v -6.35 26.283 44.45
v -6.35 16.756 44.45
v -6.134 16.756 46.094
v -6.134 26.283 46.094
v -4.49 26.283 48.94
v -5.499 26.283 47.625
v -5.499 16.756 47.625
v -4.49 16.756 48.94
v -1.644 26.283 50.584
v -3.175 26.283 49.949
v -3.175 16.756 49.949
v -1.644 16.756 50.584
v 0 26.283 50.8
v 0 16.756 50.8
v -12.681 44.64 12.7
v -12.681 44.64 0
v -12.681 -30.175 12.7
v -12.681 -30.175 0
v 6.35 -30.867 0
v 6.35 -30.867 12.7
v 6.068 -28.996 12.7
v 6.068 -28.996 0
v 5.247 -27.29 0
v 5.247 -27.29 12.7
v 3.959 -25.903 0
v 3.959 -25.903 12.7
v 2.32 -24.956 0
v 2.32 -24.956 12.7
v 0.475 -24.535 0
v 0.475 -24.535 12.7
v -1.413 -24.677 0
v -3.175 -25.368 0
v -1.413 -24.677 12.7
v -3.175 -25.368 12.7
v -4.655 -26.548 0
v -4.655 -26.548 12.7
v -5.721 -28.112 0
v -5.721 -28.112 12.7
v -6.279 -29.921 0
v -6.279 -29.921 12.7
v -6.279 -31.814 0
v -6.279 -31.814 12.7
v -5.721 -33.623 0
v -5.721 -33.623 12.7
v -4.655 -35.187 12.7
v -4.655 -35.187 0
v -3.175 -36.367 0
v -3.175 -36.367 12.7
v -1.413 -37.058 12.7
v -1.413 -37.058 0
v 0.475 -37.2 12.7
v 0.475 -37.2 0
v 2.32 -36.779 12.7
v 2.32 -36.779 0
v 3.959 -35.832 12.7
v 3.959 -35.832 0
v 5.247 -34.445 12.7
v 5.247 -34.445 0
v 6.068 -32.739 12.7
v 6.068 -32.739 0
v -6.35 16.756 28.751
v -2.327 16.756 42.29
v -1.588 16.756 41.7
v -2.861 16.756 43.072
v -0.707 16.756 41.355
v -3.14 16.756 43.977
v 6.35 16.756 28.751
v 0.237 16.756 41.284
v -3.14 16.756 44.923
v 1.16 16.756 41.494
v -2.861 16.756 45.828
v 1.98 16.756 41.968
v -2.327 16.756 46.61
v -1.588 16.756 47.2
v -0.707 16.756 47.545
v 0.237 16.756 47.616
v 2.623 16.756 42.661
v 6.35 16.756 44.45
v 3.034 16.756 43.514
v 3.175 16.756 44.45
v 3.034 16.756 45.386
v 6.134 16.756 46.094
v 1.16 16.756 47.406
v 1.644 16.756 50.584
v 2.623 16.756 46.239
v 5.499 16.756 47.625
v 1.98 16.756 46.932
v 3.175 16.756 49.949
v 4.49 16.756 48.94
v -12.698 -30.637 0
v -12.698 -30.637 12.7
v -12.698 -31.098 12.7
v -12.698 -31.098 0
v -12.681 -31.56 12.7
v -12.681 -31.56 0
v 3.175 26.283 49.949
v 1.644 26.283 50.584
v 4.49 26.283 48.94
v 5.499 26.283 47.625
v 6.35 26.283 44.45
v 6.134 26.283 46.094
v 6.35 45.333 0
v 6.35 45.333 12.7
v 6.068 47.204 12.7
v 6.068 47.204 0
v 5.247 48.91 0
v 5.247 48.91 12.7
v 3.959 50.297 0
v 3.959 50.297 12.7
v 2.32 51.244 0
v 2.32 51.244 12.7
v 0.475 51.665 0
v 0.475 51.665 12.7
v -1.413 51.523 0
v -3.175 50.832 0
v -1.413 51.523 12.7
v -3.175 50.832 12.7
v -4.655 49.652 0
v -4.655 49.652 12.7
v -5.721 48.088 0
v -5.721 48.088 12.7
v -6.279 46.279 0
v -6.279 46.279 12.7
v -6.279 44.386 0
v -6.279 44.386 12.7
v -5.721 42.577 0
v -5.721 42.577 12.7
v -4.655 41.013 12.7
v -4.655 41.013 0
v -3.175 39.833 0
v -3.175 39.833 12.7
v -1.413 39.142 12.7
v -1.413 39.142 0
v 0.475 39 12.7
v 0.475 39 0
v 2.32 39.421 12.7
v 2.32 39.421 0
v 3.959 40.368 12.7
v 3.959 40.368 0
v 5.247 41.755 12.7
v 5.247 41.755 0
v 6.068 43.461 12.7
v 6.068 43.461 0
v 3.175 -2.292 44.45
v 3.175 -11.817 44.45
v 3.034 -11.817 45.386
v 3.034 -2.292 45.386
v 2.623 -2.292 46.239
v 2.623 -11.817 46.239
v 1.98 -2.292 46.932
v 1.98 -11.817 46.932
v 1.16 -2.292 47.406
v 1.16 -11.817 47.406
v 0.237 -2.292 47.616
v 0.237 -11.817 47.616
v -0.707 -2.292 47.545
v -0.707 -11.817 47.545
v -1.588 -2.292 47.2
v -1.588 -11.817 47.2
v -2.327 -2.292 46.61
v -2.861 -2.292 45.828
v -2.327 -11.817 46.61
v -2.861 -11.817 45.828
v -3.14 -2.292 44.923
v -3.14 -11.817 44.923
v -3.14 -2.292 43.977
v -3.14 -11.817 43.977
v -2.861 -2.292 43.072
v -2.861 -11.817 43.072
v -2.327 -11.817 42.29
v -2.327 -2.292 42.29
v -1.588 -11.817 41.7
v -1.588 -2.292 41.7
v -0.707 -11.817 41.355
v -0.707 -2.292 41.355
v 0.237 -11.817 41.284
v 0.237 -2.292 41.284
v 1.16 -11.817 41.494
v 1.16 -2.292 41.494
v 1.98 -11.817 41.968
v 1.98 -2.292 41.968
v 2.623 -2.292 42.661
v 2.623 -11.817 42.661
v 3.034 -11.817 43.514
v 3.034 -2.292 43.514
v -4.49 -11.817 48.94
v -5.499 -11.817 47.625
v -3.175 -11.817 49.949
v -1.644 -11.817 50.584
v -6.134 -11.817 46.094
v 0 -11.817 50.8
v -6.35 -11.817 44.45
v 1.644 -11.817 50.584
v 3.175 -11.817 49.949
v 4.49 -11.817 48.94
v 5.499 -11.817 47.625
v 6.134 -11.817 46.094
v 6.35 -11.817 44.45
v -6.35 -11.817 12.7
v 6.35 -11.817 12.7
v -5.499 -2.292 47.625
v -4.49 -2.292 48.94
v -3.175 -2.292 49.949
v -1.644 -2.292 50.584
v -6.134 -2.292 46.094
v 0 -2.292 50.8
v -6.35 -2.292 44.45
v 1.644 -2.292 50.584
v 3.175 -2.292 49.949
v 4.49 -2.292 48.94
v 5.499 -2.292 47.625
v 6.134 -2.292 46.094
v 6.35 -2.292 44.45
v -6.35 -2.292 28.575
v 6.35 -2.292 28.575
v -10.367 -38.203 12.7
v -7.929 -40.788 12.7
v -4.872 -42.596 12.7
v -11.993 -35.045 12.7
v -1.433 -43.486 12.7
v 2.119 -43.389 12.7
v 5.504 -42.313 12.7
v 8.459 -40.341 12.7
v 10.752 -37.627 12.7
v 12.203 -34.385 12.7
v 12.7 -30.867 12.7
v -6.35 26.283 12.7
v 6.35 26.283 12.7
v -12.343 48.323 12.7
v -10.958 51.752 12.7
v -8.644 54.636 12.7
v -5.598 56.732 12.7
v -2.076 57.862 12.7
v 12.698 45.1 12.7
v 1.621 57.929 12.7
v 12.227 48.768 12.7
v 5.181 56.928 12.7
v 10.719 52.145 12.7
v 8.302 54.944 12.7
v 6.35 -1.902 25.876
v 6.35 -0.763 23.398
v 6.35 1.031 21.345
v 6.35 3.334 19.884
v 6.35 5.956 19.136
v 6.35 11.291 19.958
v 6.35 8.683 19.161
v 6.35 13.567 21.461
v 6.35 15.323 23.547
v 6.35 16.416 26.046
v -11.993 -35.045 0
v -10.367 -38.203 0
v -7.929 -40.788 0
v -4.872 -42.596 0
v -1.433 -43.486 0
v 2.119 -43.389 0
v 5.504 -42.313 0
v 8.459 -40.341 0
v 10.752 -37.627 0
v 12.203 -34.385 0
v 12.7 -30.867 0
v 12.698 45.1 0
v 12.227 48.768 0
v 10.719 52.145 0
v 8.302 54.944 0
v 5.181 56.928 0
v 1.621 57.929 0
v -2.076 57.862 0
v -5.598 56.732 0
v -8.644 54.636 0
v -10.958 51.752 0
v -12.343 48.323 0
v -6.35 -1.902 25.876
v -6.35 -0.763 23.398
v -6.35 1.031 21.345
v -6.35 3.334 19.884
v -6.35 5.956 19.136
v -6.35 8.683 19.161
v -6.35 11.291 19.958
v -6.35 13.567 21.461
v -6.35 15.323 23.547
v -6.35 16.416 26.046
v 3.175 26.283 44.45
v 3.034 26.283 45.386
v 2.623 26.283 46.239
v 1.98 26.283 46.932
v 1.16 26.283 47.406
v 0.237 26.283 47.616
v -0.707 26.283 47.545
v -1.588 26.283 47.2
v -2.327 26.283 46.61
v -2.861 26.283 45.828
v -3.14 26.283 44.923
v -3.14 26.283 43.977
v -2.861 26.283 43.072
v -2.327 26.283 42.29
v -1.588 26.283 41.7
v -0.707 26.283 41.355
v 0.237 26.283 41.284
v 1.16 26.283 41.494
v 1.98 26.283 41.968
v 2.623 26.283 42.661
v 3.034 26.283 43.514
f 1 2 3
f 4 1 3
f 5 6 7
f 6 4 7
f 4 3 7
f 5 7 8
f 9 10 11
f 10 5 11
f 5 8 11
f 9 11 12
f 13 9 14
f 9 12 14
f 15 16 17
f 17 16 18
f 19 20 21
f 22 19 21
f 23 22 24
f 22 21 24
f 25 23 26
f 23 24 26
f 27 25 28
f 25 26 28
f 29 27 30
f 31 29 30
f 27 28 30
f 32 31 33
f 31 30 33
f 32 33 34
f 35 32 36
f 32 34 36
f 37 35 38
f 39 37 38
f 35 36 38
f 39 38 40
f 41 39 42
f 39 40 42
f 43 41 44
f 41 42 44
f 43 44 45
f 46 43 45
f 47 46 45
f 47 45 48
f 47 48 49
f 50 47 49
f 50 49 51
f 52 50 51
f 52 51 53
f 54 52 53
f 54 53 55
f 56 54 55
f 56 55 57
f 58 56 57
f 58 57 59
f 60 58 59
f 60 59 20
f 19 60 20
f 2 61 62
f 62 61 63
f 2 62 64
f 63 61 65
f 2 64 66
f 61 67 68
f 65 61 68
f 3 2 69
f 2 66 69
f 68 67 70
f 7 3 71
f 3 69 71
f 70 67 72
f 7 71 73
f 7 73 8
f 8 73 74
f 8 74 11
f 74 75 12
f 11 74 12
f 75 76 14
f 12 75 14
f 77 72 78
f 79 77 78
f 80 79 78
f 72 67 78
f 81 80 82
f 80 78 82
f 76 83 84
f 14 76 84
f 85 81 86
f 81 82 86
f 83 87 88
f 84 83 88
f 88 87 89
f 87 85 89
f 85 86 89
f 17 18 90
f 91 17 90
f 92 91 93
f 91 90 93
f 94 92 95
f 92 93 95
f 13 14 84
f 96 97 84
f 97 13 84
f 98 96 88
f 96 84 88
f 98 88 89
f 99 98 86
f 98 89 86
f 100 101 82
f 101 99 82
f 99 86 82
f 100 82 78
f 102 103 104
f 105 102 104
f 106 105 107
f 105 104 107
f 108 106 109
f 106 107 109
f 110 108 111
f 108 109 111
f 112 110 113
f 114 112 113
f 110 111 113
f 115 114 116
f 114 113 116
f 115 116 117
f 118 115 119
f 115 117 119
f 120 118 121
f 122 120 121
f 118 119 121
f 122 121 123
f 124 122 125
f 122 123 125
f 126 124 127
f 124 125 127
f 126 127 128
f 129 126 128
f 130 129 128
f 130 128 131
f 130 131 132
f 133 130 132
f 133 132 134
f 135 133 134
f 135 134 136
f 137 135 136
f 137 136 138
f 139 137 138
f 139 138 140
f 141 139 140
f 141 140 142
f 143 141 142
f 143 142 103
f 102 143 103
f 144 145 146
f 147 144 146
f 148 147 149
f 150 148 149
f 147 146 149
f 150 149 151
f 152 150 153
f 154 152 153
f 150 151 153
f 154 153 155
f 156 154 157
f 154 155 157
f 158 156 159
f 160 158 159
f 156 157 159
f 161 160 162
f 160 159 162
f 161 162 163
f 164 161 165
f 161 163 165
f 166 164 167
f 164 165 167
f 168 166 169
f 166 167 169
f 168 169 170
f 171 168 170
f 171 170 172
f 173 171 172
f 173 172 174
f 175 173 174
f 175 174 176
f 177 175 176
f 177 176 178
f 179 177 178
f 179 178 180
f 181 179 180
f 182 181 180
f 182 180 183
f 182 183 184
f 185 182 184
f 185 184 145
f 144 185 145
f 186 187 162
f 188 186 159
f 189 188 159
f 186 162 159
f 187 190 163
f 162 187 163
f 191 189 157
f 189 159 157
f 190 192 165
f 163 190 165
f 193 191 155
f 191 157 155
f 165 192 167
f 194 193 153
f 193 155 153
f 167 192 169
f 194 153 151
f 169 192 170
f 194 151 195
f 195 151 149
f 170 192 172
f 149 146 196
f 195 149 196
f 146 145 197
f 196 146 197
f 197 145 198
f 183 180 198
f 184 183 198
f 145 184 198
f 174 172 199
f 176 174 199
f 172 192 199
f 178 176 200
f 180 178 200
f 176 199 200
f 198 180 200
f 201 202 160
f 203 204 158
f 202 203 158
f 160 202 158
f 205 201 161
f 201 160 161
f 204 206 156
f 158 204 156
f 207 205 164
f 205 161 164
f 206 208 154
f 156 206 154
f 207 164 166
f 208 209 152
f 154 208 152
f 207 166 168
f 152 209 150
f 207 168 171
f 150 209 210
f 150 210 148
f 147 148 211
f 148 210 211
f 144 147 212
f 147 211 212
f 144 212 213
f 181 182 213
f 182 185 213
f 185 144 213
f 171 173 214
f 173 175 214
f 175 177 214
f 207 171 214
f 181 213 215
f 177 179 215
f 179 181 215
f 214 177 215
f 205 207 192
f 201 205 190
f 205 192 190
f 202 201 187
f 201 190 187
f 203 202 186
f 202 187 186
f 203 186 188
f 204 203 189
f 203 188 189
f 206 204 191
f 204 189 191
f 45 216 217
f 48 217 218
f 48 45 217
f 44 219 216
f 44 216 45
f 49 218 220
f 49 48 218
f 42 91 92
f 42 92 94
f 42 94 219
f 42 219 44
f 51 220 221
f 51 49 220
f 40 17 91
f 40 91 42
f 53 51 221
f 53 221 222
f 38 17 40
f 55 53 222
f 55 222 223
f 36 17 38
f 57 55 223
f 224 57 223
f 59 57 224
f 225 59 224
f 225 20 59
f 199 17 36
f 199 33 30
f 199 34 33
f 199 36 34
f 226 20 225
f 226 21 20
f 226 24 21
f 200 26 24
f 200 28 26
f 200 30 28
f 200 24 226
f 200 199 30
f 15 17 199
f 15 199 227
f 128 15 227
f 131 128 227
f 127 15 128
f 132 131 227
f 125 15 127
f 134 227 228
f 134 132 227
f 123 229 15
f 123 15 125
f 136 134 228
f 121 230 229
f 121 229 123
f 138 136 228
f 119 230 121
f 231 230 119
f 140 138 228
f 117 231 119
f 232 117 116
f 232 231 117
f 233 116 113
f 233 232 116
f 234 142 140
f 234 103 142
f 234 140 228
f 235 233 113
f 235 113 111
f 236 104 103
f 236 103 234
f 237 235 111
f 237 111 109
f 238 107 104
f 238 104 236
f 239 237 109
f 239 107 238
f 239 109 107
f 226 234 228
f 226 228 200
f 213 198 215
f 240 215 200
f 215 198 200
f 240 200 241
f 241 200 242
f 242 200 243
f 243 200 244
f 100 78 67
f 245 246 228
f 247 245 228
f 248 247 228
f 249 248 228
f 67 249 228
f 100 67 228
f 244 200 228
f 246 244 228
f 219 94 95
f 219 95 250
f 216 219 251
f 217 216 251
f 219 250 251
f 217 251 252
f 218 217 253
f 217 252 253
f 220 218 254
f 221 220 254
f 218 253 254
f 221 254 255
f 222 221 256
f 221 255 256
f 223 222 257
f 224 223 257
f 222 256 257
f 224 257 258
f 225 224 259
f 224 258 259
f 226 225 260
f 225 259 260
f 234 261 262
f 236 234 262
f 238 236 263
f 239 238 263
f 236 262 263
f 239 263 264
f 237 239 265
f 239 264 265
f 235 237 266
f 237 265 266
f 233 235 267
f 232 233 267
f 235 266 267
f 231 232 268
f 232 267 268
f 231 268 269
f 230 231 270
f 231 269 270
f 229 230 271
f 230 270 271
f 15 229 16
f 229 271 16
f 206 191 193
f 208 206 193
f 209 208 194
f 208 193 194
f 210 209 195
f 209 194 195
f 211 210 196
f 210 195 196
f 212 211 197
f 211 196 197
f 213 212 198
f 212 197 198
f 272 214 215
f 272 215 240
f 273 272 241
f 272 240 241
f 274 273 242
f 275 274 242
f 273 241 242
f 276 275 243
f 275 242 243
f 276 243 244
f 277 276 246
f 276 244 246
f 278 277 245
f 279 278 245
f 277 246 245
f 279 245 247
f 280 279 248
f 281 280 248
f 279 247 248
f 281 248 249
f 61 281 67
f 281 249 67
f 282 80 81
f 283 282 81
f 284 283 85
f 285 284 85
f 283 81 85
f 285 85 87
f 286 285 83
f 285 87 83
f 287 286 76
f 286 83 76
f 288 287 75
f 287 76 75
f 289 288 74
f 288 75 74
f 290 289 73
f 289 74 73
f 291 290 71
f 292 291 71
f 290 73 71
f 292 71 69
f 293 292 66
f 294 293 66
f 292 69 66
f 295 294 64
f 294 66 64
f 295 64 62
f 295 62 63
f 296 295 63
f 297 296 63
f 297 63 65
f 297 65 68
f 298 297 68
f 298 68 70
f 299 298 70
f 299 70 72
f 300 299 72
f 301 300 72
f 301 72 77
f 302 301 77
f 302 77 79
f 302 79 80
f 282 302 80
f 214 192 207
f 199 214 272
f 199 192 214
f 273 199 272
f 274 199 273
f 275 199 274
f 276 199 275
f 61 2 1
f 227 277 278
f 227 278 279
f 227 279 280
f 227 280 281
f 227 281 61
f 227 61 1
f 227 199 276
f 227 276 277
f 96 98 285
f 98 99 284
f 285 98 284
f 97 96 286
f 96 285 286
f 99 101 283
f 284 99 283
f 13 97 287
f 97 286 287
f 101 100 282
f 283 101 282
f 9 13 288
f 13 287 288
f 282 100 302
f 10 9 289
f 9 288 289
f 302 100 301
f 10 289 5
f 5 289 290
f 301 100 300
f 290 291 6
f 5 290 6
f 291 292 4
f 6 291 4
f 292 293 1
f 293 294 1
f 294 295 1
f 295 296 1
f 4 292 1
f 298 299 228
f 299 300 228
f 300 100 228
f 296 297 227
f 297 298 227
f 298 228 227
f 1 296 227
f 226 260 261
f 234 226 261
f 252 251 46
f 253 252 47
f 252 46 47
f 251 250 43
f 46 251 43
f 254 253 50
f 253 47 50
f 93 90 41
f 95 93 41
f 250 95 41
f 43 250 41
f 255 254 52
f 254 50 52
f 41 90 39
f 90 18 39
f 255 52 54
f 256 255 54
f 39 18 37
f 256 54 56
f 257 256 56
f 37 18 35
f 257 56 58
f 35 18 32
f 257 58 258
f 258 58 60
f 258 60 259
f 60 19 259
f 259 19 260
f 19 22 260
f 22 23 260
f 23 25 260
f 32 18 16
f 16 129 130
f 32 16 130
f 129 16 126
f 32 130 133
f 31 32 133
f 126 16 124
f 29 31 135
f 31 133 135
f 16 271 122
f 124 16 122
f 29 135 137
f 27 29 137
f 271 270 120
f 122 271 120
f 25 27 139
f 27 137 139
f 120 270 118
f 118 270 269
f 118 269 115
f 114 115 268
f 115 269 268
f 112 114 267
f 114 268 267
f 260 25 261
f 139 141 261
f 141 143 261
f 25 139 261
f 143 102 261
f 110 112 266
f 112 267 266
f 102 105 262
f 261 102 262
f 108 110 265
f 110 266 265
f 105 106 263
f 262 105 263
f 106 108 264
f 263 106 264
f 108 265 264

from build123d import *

# Parameters (mm, degrees)
F1_DEPTH  = 12.7
F2_R      = 6.35
F3_DEPTH  = 31.242
F4_W      = 6.35
F4_H      = 38.1
F5_DEPTH  = 38.1
F7_DEPTH  = 61.468
F9_DEPTH  = 25.4
F10_R     = 3.175
F11_DEPTH = 50.8


with BuildPart() as f1:
    # F0 (on Top) → F1 (new body)
    with BuildSketch(Plane.XY):
        with BuildLine():
            Line((12.7, -30.8671), (12.697872, 45.100048))
            ThreePointArc((12.697872, 45.100048), (-0.230077, 58.03046), (-12.681114, 44.640199))
            Line((-12.681114, 44.640199), (-12.681114, -30.175112))
            Line((-12.681114, -30.175112), (-12.681114, -31.559801))
            ThreePointArc((-12.681114, -31.559801), (0.346479, -43.562729), (12.7, -30.8671))
        make_face()
        with BuildLine():
            Line((-12.681114, -31.559801), (-12.681114, -30.175112))
            ThreePointArc((-12.681114, -30.175112), (-12.7, -30.867456), (-12.681114, -31.559801))
        make_face()
    extrude(amount=F1_DEPTH)

    # F2 (on face) → F3 (cut)
    with BuildSketch(Plane.XY.offset(12.7)):
        with Locations((0, -30.867456)):
            Circle(F2_R)
        with Locations((0, 45.332544)):
            Circle(F2_R)
    extrude(amount=-F3_DEPTH, mode=Mode.SUBTRACT)

    # F4 (on face) → F5 (join)
    with BuildSketch(Plane.XY.offset(12.7)):
        with Locations((3.175, 7.232544)):
            Rectangle(F4_W, F4_H)
        with Locations((-3.175, 7.232544)):
            Rectangle(F4_W, F4_H)
    extrude(amount=F5_DEPTH)

    # F6 (on face) → F7 (cut)
    with BuildSketch(Plane.XZ.offset(11.817456)):
        with BuildLine():
            ThreePointArc((-6.35, 44.45), (-4.490128, 48.940128), (0, 50.8))
            Line((0, 50.8), (-6.35, 50.8))
            Line((-6.35, 50.8), (-6.35, 44.45))
        make_face()
        with BuildLine():
            ThreePointArc((0, 50.8), (4.490128, 48.940128), (6.35, 44.45))
            Line((6.35, 44.45), (6.35, 50.8))
            Line((6.35, 50.8), (0, 50.8))
        make_face()
    extrude(amount=-F7_DEPTH, mode=Mode.SUBTRACT)

    # F8 (on face) → F9 (cut)
    with BuildSketch(Plane.YZ.offset(6.35)):
        with BuildLine():
            Line((-2.292456, 44.45), (-2.292456, 28.575))
            ThreePointArc((-2.292456, 28.575), (7.32078, 19.050409), (16.755909, 28.751465))
            Line((16.755909, 28.751465), (16.755909, 53.781159))
            Line((16.755909, 53.781159), (-2.292456, 53.781159))
            Line((-2.292456, 53.781159), (-2.292456, 44.45))
        make_face()
    extrude(amount=-F9_DEPTH, mode=Mode.SUBTRACT)

    # F10 (on face) → F11 (cut)
    with BuildSketch(Plane.XZ.offset(11.817456)):
        with Locations((0, 44.45)):
            Circle(F10_R)
    extrude(amount=-F11_DEPTH, mode=Mode.SUBTRACT)


solid = f1.part
